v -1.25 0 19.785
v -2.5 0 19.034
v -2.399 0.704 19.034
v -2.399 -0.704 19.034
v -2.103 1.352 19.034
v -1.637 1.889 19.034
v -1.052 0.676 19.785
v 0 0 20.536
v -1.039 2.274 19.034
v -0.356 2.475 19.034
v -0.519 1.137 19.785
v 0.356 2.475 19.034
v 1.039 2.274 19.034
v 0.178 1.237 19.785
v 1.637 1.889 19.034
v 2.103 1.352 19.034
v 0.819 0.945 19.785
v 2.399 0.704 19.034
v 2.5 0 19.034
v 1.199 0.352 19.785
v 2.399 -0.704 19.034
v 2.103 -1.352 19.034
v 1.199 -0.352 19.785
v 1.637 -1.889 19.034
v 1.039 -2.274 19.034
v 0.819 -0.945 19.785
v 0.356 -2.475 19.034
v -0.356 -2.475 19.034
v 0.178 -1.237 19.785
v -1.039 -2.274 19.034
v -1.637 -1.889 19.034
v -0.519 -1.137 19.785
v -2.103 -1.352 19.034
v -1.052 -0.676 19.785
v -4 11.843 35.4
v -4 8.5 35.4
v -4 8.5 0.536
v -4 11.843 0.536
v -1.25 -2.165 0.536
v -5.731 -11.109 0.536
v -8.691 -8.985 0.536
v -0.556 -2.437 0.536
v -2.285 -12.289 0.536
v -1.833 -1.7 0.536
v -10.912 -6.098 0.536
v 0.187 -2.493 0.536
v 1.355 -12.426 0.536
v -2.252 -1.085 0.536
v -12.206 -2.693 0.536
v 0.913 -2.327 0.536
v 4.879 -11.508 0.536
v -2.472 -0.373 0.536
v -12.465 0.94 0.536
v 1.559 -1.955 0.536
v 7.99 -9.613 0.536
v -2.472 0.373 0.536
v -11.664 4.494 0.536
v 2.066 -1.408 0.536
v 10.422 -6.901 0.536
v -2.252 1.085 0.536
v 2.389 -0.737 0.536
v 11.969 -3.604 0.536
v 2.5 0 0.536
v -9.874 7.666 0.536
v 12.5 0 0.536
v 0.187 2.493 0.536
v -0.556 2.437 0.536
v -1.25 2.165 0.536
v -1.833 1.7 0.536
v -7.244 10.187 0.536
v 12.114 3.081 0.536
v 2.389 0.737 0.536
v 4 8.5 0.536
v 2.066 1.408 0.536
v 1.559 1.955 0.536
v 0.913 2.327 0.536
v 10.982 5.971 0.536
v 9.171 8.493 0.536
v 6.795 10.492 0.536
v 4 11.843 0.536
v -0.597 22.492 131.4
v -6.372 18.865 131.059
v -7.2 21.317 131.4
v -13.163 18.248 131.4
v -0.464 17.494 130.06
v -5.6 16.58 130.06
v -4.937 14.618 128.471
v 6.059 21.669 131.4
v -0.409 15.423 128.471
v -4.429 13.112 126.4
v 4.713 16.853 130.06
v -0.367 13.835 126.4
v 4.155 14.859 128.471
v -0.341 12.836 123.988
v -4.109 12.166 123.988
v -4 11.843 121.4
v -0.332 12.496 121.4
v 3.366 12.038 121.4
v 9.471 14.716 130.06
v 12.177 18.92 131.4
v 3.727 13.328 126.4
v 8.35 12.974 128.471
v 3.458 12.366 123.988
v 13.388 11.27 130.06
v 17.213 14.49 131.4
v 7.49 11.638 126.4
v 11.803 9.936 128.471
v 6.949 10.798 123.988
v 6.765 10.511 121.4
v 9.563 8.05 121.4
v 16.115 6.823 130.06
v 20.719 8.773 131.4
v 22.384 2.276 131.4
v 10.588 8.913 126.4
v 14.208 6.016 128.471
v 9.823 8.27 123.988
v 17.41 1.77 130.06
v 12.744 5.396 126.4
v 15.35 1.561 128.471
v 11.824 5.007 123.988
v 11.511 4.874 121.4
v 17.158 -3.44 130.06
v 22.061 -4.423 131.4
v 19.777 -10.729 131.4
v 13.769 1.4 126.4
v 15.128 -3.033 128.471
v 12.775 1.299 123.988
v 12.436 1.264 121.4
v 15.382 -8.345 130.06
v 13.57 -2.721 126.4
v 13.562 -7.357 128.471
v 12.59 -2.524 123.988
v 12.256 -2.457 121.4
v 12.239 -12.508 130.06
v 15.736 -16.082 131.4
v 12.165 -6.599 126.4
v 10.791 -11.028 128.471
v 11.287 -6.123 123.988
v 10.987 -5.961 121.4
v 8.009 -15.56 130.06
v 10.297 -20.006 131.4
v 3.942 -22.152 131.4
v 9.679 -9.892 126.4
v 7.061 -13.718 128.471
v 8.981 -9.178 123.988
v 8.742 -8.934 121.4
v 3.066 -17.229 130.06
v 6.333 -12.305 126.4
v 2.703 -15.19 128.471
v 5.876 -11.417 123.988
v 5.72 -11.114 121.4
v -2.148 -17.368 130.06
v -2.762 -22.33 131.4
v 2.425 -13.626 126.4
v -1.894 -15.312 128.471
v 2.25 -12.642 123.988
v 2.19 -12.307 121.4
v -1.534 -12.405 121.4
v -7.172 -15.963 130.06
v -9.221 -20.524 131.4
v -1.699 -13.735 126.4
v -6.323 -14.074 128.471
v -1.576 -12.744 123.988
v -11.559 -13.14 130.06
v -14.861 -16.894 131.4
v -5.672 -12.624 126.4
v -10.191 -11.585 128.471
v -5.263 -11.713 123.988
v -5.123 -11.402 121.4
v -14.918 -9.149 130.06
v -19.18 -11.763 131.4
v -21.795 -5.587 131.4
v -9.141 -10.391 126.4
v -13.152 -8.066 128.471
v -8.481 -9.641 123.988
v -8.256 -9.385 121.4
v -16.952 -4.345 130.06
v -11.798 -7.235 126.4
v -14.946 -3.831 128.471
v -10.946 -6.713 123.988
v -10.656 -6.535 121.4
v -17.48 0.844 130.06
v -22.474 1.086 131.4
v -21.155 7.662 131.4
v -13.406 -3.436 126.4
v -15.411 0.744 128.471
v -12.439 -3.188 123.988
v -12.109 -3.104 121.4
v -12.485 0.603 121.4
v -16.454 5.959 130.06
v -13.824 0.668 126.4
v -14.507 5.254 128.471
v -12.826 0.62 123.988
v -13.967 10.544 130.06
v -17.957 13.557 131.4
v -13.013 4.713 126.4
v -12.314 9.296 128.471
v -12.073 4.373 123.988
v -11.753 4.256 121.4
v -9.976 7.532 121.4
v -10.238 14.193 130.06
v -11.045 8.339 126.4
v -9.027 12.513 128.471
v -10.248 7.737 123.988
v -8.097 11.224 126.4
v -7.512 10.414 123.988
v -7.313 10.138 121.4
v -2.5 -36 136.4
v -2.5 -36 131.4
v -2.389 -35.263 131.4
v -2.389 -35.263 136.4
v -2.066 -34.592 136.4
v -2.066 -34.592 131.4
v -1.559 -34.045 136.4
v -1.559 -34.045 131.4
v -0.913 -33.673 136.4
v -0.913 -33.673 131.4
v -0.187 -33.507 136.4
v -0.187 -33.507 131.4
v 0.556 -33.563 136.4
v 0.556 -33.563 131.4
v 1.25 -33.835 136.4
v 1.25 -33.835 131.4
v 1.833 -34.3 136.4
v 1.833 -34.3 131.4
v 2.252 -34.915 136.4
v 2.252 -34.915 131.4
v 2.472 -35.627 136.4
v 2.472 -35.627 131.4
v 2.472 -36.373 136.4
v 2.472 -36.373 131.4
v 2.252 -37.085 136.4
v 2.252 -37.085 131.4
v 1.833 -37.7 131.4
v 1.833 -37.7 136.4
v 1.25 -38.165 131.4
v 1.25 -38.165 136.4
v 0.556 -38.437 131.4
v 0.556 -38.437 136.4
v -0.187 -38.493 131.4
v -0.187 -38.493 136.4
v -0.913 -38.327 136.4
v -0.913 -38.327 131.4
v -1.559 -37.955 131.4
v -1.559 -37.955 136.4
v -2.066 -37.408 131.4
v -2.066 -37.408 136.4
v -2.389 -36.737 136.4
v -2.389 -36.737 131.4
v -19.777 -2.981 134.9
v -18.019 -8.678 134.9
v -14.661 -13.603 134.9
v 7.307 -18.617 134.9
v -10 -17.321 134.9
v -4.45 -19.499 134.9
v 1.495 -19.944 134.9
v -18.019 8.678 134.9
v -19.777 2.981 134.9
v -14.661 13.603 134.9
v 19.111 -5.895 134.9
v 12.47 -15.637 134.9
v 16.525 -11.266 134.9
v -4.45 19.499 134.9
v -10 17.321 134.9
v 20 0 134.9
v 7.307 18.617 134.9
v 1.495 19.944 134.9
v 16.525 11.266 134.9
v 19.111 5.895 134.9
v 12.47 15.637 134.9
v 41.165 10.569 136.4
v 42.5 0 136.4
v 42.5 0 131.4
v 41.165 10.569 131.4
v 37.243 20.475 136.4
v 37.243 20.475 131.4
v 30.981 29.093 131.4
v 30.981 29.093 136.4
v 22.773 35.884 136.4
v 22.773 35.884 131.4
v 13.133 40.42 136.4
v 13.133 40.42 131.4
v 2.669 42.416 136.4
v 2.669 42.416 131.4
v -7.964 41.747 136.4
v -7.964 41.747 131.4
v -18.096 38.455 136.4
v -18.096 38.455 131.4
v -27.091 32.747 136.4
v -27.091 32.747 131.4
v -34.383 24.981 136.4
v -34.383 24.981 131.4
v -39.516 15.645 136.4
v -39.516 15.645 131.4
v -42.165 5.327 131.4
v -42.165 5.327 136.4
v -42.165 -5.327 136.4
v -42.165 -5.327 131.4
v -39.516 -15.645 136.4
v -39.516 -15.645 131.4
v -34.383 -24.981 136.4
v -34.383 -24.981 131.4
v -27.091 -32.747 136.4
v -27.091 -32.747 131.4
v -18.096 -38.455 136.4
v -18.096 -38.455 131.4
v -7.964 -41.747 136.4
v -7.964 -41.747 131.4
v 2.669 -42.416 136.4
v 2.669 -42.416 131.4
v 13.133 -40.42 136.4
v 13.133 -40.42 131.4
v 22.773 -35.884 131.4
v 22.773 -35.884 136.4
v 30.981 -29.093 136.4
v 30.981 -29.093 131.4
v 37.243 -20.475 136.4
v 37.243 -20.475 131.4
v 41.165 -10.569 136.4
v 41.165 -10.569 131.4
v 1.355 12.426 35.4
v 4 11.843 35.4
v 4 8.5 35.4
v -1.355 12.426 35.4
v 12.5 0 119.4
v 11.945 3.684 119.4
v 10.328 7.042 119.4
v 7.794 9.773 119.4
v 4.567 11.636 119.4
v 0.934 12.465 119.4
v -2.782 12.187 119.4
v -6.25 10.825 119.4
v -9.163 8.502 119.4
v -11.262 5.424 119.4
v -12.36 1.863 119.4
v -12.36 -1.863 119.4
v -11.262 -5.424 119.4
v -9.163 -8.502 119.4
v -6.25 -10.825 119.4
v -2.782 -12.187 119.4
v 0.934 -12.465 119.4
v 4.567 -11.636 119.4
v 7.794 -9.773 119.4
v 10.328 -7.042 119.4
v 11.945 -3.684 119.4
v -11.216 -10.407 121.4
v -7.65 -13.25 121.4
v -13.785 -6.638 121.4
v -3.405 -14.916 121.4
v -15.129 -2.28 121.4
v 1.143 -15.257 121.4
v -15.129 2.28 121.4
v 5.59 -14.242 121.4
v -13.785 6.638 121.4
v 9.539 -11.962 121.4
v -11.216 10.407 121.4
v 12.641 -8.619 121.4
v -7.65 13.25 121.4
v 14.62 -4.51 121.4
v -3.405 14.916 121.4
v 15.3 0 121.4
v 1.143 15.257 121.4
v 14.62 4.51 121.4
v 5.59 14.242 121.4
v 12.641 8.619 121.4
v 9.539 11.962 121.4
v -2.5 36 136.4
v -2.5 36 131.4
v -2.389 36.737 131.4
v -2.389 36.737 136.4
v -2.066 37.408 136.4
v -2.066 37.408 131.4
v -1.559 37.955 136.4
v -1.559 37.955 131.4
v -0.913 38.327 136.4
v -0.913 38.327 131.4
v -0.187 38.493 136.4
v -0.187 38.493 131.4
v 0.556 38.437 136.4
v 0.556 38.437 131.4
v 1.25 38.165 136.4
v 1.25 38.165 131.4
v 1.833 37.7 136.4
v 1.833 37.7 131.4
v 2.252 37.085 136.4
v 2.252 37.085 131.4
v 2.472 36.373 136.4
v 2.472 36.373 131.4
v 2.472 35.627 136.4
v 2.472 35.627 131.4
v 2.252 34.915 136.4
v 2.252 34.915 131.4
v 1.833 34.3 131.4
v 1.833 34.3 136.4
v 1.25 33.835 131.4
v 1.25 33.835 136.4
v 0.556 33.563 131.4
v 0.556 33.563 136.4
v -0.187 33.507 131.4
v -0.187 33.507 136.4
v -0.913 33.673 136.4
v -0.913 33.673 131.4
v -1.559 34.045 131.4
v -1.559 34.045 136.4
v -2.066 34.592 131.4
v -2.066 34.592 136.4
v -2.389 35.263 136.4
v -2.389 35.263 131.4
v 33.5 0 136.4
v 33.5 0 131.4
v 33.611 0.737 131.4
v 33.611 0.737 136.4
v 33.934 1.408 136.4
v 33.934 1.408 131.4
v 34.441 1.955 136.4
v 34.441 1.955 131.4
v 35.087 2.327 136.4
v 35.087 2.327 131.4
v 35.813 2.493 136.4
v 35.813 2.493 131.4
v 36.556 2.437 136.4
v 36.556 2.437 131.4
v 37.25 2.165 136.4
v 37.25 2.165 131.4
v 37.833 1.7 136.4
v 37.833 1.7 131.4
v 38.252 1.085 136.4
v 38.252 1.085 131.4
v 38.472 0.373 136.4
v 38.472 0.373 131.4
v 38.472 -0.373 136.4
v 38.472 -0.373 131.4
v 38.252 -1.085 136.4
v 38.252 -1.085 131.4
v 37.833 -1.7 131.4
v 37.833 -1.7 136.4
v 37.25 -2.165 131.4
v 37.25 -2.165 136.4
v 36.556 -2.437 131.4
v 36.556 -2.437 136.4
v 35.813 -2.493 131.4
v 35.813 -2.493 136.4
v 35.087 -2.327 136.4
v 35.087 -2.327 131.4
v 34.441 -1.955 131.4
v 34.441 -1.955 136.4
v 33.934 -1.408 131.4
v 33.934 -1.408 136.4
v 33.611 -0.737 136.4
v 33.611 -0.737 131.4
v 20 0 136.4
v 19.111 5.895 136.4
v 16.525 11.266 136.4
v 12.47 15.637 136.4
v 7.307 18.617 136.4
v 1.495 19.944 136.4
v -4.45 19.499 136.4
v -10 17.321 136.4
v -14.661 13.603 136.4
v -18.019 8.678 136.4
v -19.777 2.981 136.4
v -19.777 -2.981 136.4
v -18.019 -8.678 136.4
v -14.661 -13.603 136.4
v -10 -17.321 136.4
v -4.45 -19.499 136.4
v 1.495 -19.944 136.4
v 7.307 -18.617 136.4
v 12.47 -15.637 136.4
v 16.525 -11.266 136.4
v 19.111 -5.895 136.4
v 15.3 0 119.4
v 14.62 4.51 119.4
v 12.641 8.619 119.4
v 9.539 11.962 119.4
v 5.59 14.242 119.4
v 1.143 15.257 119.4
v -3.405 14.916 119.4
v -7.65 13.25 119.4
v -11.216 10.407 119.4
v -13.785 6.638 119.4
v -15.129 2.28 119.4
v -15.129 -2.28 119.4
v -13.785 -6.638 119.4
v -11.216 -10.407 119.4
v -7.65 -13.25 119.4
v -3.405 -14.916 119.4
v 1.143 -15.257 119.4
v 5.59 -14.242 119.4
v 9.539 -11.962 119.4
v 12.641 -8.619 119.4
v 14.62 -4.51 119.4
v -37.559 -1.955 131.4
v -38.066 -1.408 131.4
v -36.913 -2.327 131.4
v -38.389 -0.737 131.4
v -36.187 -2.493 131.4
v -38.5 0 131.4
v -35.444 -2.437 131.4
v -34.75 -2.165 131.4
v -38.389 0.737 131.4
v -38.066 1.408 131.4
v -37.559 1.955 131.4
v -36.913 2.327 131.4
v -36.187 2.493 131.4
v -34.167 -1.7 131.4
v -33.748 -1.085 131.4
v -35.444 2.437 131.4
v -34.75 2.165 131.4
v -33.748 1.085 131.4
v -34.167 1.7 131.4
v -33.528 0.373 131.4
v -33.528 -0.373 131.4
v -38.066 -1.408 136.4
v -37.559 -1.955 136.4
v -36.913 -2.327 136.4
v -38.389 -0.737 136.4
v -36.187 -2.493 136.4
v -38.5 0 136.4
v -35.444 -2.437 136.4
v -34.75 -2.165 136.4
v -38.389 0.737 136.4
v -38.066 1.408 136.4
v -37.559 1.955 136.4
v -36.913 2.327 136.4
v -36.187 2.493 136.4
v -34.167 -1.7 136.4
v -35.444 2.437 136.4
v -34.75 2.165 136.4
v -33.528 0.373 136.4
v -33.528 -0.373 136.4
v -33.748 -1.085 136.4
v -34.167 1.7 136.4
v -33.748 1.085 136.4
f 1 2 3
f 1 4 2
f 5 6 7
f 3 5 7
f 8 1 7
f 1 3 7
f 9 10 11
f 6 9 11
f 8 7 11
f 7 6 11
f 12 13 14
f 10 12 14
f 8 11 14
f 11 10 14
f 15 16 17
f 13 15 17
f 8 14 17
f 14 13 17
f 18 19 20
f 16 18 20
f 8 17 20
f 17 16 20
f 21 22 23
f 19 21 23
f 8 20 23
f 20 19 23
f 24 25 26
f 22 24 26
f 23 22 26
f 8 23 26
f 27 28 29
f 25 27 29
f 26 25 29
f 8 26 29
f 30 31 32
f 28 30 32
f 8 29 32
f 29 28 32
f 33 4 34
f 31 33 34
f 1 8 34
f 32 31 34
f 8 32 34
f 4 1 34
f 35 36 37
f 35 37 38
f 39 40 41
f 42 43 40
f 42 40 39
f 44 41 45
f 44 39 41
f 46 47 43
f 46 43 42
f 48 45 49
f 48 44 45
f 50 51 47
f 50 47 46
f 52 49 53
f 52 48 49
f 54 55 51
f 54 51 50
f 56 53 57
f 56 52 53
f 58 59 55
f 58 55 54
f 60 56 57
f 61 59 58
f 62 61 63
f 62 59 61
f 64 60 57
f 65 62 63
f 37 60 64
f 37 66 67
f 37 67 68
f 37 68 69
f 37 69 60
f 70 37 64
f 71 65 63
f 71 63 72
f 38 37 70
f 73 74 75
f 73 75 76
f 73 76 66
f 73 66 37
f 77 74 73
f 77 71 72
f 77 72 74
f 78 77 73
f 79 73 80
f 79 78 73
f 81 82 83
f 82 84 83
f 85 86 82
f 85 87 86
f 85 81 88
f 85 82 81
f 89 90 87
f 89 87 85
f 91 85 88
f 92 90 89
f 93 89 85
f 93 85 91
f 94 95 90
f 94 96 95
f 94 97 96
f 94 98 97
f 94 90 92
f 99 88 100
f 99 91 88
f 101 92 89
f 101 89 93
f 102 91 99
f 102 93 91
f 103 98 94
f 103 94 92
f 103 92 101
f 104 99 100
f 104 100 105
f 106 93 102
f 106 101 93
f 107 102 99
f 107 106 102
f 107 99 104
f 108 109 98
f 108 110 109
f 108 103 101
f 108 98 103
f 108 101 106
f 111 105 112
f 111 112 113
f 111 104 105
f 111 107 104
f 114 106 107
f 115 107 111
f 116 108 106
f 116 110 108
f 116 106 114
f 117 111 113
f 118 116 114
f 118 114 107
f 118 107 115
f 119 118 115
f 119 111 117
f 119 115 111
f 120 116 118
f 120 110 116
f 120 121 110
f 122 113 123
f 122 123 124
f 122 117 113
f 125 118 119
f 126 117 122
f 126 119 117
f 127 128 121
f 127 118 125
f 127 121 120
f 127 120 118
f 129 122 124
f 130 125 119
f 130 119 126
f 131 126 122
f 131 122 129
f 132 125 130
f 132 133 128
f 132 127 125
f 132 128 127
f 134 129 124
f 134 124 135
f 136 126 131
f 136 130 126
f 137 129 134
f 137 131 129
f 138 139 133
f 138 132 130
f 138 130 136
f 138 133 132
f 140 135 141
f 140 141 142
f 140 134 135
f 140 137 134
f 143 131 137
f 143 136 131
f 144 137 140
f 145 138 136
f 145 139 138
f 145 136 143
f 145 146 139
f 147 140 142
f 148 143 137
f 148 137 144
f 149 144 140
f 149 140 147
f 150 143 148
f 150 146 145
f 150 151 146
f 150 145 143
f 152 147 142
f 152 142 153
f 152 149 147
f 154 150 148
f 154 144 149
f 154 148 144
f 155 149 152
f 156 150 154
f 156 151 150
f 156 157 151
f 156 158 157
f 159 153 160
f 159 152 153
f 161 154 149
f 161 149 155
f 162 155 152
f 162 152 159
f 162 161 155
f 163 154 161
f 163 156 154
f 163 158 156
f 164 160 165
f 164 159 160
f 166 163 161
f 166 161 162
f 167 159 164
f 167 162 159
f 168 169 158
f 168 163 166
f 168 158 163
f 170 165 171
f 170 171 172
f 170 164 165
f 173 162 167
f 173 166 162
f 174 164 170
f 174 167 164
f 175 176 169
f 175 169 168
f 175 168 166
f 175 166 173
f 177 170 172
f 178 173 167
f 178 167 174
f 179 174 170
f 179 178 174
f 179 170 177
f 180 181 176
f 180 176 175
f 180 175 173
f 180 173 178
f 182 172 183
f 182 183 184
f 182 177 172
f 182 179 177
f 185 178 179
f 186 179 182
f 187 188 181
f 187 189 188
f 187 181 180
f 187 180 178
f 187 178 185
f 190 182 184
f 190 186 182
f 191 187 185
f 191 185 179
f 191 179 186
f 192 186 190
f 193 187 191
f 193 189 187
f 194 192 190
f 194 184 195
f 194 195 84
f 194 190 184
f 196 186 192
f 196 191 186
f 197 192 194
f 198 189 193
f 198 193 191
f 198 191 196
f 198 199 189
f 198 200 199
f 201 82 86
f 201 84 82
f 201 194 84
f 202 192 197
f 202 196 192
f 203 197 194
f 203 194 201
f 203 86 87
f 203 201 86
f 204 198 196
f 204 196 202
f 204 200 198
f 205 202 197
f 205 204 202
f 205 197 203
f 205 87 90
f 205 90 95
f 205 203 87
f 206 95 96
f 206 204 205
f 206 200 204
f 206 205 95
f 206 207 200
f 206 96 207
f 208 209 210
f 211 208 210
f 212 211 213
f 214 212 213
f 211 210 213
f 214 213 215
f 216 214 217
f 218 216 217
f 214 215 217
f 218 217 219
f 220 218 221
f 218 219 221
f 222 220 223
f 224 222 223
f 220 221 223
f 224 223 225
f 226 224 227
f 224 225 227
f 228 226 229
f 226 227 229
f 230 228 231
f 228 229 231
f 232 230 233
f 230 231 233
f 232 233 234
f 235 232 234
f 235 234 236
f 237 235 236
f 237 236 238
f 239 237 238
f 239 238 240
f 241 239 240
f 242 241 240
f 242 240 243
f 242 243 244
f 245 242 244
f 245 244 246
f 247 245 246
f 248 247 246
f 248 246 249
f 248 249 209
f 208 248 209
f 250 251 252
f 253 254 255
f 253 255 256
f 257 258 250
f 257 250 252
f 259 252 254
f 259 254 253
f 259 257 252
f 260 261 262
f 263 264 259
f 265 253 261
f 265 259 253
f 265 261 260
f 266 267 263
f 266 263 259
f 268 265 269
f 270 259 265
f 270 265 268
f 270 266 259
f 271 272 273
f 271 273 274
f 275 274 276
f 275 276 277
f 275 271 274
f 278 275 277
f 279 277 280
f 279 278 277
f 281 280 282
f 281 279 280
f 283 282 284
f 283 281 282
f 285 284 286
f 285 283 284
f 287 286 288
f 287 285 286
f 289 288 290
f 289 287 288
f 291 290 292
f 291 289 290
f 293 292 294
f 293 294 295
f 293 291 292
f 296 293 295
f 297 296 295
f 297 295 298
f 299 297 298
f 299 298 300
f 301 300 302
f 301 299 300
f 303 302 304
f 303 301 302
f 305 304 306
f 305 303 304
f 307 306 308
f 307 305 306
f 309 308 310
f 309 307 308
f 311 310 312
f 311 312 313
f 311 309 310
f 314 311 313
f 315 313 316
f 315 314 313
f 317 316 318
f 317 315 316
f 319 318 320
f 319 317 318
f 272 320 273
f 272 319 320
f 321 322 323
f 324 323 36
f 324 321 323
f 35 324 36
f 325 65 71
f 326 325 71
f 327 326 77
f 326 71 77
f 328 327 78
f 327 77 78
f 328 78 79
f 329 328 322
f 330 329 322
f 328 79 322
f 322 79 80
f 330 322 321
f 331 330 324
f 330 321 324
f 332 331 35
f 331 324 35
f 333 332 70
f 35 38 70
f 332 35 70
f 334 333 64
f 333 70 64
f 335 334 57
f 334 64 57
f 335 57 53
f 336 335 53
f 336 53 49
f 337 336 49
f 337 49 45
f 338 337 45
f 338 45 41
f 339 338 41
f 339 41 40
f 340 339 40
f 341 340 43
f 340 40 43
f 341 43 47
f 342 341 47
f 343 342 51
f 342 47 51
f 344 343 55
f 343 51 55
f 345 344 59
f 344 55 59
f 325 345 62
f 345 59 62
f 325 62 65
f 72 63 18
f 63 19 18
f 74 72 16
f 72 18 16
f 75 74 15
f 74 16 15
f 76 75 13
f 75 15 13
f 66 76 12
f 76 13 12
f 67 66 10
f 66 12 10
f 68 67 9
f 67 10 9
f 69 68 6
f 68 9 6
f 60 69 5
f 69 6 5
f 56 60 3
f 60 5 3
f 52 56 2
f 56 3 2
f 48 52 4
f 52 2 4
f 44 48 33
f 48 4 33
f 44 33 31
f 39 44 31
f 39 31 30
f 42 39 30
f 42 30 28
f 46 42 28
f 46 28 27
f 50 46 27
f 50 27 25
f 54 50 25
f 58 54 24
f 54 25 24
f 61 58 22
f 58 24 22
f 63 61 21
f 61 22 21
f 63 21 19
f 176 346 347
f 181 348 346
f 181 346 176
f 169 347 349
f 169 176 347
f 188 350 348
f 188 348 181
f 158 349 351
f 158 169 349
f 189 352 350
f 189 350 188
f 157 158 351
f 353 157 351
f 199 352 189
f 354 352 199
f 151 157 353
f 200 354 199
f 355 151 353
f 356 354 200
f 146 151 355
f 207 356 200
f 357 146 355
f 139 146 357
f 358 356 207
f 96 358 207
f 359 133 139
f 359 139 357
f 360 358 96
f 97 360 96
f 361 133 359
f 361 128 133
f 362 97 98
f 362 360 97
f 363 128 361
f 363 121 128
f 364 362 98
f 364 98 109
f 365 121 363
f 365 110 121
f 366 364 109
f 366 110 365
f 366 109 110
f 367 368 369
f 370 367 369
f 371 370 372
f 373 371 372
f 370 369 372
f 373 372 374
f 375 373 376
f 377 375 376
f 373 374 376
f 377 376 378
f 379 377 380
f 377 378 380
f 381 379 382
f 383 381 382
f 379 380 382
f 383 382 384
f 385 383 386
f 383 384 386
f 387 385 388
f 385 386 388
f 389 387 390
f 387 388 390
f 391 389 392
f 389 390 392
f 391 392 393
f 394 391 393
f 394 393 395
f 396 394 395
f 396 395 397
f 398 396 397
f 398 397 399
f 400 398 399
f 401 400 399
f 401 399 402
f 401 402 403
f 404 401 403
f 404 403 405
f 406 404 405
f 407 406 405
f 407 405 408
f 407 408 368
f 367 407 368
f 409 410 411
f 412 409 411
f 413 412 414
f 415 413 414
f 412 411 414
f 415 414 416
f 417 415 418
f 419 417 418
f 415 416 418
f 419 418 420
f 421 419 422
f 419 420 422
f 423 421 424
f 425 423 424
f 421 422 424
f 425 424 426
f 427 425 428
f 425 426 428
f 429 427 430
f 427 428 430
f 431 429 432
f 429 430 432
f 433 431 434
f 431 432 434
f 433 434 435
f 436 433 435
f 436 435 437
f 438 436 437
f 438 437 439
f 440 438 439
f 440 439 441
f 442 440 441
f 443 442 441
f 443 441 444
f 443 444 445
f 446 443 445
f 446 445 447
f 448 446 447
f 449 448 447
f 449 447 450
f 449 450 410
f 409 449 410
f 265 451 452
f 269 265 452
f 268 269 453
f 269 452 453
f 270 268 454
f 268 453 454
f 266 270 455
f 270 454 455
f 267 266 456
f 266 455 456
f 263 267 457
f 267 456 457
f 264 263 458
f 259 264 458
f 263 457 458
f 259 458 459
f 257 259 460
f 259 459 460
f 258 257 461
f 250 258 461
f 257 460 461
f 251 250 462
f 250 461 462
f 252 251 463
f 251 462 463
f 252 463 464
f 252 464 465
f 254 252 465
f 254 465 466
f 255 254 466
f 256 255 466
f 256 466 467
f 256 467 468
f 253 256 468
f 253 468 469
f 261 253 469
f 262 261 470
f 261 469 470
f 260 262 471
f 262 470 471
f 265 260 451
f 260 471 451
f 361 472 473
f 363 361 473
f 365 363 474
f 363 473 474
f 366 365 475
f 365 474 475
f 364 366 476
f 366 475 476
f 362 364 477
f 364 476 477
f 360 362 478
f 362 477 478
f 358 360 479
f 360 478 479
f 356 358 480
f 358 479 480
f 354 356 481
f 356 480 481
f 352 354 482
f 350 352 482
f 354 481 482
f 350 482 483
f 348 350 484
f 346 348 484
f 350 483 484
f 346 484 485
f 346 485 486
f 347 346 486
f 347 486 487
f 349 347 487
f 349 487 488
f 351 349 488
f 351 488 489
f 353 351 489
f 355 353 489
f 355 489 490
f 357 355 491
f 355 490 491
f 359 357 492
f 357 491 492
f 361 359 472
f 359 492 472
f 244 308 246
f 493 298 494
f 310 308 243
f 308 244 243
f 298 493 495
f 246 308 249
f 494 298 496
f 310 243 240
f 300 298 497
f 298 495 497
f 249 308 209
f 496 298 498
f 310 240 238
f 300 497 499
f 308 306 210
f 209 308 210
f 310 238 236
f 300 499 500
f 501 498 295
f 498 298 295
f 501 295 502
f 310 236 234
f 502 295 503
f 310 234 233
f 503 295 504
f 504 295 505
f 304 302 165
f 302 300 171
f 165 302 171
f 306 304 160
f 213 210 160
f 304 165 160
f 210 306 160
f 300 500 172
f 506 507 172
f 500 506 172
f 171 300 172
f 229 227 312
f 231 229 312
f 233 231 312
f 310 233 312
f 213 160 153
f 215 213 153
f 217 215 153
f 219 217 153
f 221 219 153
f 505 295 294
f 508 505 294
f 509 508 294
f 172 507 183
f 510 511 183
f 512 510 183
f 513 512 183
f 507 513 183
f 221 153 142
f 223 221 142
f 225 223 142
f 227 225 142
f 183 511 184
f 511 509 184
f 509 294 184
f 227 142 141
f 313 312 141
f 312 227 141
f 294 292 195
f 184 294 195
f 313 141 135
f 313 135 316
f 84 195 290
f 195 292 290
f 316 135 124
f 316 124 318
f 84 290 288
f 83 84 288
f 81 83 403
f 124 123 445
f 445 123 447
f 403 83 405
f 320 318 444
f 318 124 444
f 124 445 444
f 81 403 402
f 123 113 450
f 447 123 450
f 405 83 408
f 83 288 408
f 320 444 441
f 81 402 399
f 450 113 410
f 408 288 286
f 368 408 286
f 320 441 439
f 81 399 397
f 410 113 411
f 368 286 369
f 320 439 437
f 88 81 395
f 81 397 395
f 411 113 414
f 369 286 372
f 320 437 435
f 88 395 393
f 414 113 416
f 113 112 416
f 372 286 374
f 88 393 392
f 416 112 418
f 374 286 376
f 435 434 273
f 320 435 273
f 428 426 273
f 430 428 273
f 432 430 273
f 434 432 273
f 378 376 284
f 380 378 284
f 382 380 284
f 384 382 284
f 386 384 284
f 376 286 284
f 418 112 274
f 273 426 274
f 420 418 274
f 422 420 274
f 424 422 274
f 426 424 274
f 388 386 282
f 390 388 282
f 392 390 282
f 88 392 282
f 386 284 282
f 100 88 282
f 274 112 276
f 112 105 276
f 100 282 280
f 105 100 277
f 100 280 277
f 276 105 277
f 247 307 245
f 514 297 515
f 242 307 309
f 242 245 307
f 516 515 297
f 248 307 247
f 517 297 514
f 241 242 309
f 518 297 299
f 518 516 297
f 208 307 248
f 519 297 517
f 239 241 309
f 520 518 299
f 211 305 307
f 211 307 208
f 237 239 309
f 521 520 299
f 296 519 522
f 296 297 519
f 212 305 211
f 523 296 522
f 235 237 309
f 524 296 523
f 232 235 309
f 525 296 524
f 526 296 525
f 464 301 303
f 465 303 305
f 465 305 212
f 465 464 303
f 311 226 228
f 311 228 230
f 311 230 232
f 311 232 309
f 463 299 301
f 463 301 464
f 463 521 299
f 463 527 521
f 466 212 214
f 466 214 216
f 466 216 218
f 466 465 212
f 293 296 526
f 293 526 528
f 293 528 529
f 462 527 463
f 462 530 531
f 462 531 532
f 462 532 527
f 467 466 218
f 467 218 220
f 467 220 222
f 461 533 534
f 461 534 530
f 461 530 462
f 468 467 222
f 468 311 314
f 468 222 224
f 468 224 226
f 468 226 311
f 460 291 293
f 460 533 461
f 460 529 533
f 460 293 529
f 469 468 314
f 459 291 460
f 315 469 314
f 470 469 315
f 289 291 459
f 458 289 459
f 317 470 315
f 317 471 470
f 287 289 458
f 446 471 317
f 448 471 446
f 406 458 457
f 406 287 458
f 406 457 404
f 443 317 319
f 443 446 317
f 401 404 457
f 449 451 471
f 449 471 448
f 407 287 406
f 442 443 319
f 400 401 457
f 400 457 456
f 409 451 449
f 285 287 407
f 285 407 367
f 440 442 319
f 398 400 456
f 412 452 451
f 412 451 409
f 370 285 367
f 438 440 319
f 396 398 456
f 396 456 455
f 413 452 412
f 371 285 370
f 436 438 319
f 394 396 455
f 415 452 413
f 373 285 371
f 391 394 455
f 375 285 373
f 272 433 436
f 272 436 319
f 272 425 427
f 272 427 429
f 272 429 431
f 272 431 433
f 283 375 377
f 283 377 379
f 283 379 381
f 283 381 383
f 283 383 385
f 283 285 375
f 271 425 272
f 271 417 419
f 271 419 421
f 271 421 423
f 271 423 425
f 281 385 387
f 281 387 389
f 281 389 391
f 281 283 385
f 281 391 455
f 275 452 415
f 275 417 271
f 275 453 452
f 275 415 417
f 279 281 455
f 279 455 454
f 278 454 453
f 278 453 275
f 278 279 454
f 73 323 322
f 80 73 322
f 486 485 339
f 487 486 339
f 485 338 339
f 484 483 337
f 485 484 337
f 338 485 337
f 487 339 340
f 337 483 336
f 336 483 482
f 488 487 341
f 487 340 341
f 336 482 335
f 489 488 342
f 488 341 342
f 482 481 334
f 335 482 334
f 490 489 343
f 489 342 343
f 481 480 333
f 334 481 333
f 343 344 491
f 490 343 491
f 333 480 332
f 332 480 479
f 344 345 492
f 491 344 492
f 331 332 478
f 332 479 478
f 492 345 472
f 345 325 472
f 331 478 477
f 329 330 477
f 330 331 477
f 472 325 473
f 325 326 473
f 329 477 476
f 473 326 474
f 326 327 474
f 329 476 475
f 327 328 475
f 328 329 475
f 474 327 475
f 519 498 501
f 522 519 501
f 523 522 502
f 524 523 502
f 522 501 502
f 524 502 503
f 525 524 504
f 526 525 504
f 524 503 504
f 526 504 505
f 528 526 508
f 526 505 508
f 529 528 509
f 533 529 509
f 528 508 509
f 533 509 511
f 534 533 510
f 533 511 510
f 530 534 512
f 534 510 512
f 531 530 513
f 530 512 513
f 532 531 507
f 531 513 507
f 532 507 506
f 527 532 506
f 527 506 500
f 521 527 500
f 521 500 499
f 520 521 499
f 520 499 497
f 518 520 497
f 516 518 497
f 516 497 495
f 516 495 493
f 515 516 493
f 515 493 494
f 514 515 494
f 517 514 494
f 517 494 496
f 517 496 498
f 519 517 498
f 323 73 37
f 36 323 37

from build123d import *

# Parameters (mm, degrees)
SKETCH1_R                 = 12.5
BOSS_EXTRUDE1_DEPTH       = 119.4
SKETCH4_W                 = 8
SKETCH4_H                 = 8
CUT_EXTRUDE1_DEPTH        = 35.4
SKETCH5_R                 = 15.3
BOSS_EXTRUDE2_DEPTH       = 2
SKETCH10_R                = 12.5
BOSS_EXTRUDE5_DEPTH       = 15
SKETCH14_R                = 12.5
CUT_EXTRUDE3_DEPTH        = 0.53629326
M6X1_0_TAPPED_HOLE2_D     = 5
M6X1_0_TAPPED_HOLE2_DEPTH = 18.497848452
M6X1_0_TAPPED_HOLE2_TIP   = 1.502151548
SKETCH20_R                = 42.5
BOSS_EXTRUDE6_DEPTH       = 5
FILLET3_R                 = 10
M6X1_0_TAPPED_HOLE3_D     = 5
SKETCH23_R                = 20
CUT_EXTRUDE4_DEPTH        = 1.5


with BuildPart() as part:
    # Sketch1 → Boss-Extrude1 (new body)
    with BuildSketch(Plane.XY):
        Circle(SKETCH1_R)
    extrude(amount=BOSS_EXTRUDE1_DEPTH)

    # Sketch4 → Cut-Extrude1 (cut)
    with BuildSketch(Plane(origin=(0, 0, 0), x_dir=(-1, 0, 0), z_dir=(0, 0, -1))):
        with Locations((0, 12.5)):
            Rectangle(SKETCH4_W, SKETCH4_H)
    extrude(amount=-CUT_EXTRUDE1_DEPTH, mode=Mode.SUBTRACT)

    # Sketch5 → Boss-Extrude2 (add)
    with BuildSketch(Plane.XY.offset(119.4)):
        Circle(SKETCH5_R)
    extrude(amount=BOSS_EXTRUDE2_DEPTH)

    # Sketch10 → Boss-Extrude5 (add)
    with BuildSketch(Plane.XY.offset(121.4)):
        with Locations(Location((0, 0, 0), (0, 0, 108.662924885))):
            Circle(SKETCH10_R)
    extrude(amount=BOSS_EXTRUDE5_DEPTH)

    # Sketch14 → Cut-Extrude3 (cut)
    with BuildSketch(Plane(origin=(0, 0, 0), x_dir=(-1, 0, 0), z_dir=(0, 0, -1))):
        with Locations(Location((0, 0, 0), (0, 0, 71.337075115))):
            Circle(SKETCH14_R)
    extrude(amount=-CUT_EXTRUDE3_DEPTH, mode=Mode.SUBTRACT)

    # M6x1.0 Tapped Hole2
    with Locations(Plane(origin=(0, 0, 0.53629326), x_dir=(-1, 0, 0), z_dir=(0, 0, -1))):
        with Locations((0, 0)):
            Hole(M6X1_0_TAPPED_HOLE2_D / 2, depth=M6X1_0_TAPPED_HOLE2_DEPTH)
            with Locations((0, 0, -(M6X1_0_TAPPED_HOLE2_DEPTH + M6X1_0_TAPPED_HOLE2_TIP / 2))):  # 118° drill point
                Cone(0, M6X1_0_TAPPED_HOLE2_D / 2, M6X1_0_TAPPED_HOLE2_TIP, mode=Mode.SUBTRACT)

    # Sketch20 → Boss-Extrude6 (add)
    with BuildSketch(Plane.XY.offset(136.4)):
        Circle(SKETCH20_R)
    extrude(amount=-BOSS_EXTRUDE6_DEPTH)

    # Fillet3
    fillet3_edges = [part.edges().sort_by_distance(p)[0] for p in [
        (4, -11.842719282, 131.4),
    ]]
    fillet(fillet3_edges, radius=FILLET3_R - 0.0001)  # a hair under: the kernel refuses the full size

    # M6x1.0 Tapped Hole3 (through all)
    with Locations(Plane.XY.offset(136.4)):
        with Locations((0, 36), (36, 0), (0, -36), (-36, 0)):
            Hole(M6X1_0_TAPPED_HOLE3_D / 2)

    # Sketch23 → Cut-Extrude4 (cut)
    with BuildSketch(Plane.XY.offset(136.4)):
        Circle(SKETCH23_R)
    extrude(amount=-CUT_EXTRUDE4_DEPTH, mode=Mode.SUBTRACT)


solid = part.part
